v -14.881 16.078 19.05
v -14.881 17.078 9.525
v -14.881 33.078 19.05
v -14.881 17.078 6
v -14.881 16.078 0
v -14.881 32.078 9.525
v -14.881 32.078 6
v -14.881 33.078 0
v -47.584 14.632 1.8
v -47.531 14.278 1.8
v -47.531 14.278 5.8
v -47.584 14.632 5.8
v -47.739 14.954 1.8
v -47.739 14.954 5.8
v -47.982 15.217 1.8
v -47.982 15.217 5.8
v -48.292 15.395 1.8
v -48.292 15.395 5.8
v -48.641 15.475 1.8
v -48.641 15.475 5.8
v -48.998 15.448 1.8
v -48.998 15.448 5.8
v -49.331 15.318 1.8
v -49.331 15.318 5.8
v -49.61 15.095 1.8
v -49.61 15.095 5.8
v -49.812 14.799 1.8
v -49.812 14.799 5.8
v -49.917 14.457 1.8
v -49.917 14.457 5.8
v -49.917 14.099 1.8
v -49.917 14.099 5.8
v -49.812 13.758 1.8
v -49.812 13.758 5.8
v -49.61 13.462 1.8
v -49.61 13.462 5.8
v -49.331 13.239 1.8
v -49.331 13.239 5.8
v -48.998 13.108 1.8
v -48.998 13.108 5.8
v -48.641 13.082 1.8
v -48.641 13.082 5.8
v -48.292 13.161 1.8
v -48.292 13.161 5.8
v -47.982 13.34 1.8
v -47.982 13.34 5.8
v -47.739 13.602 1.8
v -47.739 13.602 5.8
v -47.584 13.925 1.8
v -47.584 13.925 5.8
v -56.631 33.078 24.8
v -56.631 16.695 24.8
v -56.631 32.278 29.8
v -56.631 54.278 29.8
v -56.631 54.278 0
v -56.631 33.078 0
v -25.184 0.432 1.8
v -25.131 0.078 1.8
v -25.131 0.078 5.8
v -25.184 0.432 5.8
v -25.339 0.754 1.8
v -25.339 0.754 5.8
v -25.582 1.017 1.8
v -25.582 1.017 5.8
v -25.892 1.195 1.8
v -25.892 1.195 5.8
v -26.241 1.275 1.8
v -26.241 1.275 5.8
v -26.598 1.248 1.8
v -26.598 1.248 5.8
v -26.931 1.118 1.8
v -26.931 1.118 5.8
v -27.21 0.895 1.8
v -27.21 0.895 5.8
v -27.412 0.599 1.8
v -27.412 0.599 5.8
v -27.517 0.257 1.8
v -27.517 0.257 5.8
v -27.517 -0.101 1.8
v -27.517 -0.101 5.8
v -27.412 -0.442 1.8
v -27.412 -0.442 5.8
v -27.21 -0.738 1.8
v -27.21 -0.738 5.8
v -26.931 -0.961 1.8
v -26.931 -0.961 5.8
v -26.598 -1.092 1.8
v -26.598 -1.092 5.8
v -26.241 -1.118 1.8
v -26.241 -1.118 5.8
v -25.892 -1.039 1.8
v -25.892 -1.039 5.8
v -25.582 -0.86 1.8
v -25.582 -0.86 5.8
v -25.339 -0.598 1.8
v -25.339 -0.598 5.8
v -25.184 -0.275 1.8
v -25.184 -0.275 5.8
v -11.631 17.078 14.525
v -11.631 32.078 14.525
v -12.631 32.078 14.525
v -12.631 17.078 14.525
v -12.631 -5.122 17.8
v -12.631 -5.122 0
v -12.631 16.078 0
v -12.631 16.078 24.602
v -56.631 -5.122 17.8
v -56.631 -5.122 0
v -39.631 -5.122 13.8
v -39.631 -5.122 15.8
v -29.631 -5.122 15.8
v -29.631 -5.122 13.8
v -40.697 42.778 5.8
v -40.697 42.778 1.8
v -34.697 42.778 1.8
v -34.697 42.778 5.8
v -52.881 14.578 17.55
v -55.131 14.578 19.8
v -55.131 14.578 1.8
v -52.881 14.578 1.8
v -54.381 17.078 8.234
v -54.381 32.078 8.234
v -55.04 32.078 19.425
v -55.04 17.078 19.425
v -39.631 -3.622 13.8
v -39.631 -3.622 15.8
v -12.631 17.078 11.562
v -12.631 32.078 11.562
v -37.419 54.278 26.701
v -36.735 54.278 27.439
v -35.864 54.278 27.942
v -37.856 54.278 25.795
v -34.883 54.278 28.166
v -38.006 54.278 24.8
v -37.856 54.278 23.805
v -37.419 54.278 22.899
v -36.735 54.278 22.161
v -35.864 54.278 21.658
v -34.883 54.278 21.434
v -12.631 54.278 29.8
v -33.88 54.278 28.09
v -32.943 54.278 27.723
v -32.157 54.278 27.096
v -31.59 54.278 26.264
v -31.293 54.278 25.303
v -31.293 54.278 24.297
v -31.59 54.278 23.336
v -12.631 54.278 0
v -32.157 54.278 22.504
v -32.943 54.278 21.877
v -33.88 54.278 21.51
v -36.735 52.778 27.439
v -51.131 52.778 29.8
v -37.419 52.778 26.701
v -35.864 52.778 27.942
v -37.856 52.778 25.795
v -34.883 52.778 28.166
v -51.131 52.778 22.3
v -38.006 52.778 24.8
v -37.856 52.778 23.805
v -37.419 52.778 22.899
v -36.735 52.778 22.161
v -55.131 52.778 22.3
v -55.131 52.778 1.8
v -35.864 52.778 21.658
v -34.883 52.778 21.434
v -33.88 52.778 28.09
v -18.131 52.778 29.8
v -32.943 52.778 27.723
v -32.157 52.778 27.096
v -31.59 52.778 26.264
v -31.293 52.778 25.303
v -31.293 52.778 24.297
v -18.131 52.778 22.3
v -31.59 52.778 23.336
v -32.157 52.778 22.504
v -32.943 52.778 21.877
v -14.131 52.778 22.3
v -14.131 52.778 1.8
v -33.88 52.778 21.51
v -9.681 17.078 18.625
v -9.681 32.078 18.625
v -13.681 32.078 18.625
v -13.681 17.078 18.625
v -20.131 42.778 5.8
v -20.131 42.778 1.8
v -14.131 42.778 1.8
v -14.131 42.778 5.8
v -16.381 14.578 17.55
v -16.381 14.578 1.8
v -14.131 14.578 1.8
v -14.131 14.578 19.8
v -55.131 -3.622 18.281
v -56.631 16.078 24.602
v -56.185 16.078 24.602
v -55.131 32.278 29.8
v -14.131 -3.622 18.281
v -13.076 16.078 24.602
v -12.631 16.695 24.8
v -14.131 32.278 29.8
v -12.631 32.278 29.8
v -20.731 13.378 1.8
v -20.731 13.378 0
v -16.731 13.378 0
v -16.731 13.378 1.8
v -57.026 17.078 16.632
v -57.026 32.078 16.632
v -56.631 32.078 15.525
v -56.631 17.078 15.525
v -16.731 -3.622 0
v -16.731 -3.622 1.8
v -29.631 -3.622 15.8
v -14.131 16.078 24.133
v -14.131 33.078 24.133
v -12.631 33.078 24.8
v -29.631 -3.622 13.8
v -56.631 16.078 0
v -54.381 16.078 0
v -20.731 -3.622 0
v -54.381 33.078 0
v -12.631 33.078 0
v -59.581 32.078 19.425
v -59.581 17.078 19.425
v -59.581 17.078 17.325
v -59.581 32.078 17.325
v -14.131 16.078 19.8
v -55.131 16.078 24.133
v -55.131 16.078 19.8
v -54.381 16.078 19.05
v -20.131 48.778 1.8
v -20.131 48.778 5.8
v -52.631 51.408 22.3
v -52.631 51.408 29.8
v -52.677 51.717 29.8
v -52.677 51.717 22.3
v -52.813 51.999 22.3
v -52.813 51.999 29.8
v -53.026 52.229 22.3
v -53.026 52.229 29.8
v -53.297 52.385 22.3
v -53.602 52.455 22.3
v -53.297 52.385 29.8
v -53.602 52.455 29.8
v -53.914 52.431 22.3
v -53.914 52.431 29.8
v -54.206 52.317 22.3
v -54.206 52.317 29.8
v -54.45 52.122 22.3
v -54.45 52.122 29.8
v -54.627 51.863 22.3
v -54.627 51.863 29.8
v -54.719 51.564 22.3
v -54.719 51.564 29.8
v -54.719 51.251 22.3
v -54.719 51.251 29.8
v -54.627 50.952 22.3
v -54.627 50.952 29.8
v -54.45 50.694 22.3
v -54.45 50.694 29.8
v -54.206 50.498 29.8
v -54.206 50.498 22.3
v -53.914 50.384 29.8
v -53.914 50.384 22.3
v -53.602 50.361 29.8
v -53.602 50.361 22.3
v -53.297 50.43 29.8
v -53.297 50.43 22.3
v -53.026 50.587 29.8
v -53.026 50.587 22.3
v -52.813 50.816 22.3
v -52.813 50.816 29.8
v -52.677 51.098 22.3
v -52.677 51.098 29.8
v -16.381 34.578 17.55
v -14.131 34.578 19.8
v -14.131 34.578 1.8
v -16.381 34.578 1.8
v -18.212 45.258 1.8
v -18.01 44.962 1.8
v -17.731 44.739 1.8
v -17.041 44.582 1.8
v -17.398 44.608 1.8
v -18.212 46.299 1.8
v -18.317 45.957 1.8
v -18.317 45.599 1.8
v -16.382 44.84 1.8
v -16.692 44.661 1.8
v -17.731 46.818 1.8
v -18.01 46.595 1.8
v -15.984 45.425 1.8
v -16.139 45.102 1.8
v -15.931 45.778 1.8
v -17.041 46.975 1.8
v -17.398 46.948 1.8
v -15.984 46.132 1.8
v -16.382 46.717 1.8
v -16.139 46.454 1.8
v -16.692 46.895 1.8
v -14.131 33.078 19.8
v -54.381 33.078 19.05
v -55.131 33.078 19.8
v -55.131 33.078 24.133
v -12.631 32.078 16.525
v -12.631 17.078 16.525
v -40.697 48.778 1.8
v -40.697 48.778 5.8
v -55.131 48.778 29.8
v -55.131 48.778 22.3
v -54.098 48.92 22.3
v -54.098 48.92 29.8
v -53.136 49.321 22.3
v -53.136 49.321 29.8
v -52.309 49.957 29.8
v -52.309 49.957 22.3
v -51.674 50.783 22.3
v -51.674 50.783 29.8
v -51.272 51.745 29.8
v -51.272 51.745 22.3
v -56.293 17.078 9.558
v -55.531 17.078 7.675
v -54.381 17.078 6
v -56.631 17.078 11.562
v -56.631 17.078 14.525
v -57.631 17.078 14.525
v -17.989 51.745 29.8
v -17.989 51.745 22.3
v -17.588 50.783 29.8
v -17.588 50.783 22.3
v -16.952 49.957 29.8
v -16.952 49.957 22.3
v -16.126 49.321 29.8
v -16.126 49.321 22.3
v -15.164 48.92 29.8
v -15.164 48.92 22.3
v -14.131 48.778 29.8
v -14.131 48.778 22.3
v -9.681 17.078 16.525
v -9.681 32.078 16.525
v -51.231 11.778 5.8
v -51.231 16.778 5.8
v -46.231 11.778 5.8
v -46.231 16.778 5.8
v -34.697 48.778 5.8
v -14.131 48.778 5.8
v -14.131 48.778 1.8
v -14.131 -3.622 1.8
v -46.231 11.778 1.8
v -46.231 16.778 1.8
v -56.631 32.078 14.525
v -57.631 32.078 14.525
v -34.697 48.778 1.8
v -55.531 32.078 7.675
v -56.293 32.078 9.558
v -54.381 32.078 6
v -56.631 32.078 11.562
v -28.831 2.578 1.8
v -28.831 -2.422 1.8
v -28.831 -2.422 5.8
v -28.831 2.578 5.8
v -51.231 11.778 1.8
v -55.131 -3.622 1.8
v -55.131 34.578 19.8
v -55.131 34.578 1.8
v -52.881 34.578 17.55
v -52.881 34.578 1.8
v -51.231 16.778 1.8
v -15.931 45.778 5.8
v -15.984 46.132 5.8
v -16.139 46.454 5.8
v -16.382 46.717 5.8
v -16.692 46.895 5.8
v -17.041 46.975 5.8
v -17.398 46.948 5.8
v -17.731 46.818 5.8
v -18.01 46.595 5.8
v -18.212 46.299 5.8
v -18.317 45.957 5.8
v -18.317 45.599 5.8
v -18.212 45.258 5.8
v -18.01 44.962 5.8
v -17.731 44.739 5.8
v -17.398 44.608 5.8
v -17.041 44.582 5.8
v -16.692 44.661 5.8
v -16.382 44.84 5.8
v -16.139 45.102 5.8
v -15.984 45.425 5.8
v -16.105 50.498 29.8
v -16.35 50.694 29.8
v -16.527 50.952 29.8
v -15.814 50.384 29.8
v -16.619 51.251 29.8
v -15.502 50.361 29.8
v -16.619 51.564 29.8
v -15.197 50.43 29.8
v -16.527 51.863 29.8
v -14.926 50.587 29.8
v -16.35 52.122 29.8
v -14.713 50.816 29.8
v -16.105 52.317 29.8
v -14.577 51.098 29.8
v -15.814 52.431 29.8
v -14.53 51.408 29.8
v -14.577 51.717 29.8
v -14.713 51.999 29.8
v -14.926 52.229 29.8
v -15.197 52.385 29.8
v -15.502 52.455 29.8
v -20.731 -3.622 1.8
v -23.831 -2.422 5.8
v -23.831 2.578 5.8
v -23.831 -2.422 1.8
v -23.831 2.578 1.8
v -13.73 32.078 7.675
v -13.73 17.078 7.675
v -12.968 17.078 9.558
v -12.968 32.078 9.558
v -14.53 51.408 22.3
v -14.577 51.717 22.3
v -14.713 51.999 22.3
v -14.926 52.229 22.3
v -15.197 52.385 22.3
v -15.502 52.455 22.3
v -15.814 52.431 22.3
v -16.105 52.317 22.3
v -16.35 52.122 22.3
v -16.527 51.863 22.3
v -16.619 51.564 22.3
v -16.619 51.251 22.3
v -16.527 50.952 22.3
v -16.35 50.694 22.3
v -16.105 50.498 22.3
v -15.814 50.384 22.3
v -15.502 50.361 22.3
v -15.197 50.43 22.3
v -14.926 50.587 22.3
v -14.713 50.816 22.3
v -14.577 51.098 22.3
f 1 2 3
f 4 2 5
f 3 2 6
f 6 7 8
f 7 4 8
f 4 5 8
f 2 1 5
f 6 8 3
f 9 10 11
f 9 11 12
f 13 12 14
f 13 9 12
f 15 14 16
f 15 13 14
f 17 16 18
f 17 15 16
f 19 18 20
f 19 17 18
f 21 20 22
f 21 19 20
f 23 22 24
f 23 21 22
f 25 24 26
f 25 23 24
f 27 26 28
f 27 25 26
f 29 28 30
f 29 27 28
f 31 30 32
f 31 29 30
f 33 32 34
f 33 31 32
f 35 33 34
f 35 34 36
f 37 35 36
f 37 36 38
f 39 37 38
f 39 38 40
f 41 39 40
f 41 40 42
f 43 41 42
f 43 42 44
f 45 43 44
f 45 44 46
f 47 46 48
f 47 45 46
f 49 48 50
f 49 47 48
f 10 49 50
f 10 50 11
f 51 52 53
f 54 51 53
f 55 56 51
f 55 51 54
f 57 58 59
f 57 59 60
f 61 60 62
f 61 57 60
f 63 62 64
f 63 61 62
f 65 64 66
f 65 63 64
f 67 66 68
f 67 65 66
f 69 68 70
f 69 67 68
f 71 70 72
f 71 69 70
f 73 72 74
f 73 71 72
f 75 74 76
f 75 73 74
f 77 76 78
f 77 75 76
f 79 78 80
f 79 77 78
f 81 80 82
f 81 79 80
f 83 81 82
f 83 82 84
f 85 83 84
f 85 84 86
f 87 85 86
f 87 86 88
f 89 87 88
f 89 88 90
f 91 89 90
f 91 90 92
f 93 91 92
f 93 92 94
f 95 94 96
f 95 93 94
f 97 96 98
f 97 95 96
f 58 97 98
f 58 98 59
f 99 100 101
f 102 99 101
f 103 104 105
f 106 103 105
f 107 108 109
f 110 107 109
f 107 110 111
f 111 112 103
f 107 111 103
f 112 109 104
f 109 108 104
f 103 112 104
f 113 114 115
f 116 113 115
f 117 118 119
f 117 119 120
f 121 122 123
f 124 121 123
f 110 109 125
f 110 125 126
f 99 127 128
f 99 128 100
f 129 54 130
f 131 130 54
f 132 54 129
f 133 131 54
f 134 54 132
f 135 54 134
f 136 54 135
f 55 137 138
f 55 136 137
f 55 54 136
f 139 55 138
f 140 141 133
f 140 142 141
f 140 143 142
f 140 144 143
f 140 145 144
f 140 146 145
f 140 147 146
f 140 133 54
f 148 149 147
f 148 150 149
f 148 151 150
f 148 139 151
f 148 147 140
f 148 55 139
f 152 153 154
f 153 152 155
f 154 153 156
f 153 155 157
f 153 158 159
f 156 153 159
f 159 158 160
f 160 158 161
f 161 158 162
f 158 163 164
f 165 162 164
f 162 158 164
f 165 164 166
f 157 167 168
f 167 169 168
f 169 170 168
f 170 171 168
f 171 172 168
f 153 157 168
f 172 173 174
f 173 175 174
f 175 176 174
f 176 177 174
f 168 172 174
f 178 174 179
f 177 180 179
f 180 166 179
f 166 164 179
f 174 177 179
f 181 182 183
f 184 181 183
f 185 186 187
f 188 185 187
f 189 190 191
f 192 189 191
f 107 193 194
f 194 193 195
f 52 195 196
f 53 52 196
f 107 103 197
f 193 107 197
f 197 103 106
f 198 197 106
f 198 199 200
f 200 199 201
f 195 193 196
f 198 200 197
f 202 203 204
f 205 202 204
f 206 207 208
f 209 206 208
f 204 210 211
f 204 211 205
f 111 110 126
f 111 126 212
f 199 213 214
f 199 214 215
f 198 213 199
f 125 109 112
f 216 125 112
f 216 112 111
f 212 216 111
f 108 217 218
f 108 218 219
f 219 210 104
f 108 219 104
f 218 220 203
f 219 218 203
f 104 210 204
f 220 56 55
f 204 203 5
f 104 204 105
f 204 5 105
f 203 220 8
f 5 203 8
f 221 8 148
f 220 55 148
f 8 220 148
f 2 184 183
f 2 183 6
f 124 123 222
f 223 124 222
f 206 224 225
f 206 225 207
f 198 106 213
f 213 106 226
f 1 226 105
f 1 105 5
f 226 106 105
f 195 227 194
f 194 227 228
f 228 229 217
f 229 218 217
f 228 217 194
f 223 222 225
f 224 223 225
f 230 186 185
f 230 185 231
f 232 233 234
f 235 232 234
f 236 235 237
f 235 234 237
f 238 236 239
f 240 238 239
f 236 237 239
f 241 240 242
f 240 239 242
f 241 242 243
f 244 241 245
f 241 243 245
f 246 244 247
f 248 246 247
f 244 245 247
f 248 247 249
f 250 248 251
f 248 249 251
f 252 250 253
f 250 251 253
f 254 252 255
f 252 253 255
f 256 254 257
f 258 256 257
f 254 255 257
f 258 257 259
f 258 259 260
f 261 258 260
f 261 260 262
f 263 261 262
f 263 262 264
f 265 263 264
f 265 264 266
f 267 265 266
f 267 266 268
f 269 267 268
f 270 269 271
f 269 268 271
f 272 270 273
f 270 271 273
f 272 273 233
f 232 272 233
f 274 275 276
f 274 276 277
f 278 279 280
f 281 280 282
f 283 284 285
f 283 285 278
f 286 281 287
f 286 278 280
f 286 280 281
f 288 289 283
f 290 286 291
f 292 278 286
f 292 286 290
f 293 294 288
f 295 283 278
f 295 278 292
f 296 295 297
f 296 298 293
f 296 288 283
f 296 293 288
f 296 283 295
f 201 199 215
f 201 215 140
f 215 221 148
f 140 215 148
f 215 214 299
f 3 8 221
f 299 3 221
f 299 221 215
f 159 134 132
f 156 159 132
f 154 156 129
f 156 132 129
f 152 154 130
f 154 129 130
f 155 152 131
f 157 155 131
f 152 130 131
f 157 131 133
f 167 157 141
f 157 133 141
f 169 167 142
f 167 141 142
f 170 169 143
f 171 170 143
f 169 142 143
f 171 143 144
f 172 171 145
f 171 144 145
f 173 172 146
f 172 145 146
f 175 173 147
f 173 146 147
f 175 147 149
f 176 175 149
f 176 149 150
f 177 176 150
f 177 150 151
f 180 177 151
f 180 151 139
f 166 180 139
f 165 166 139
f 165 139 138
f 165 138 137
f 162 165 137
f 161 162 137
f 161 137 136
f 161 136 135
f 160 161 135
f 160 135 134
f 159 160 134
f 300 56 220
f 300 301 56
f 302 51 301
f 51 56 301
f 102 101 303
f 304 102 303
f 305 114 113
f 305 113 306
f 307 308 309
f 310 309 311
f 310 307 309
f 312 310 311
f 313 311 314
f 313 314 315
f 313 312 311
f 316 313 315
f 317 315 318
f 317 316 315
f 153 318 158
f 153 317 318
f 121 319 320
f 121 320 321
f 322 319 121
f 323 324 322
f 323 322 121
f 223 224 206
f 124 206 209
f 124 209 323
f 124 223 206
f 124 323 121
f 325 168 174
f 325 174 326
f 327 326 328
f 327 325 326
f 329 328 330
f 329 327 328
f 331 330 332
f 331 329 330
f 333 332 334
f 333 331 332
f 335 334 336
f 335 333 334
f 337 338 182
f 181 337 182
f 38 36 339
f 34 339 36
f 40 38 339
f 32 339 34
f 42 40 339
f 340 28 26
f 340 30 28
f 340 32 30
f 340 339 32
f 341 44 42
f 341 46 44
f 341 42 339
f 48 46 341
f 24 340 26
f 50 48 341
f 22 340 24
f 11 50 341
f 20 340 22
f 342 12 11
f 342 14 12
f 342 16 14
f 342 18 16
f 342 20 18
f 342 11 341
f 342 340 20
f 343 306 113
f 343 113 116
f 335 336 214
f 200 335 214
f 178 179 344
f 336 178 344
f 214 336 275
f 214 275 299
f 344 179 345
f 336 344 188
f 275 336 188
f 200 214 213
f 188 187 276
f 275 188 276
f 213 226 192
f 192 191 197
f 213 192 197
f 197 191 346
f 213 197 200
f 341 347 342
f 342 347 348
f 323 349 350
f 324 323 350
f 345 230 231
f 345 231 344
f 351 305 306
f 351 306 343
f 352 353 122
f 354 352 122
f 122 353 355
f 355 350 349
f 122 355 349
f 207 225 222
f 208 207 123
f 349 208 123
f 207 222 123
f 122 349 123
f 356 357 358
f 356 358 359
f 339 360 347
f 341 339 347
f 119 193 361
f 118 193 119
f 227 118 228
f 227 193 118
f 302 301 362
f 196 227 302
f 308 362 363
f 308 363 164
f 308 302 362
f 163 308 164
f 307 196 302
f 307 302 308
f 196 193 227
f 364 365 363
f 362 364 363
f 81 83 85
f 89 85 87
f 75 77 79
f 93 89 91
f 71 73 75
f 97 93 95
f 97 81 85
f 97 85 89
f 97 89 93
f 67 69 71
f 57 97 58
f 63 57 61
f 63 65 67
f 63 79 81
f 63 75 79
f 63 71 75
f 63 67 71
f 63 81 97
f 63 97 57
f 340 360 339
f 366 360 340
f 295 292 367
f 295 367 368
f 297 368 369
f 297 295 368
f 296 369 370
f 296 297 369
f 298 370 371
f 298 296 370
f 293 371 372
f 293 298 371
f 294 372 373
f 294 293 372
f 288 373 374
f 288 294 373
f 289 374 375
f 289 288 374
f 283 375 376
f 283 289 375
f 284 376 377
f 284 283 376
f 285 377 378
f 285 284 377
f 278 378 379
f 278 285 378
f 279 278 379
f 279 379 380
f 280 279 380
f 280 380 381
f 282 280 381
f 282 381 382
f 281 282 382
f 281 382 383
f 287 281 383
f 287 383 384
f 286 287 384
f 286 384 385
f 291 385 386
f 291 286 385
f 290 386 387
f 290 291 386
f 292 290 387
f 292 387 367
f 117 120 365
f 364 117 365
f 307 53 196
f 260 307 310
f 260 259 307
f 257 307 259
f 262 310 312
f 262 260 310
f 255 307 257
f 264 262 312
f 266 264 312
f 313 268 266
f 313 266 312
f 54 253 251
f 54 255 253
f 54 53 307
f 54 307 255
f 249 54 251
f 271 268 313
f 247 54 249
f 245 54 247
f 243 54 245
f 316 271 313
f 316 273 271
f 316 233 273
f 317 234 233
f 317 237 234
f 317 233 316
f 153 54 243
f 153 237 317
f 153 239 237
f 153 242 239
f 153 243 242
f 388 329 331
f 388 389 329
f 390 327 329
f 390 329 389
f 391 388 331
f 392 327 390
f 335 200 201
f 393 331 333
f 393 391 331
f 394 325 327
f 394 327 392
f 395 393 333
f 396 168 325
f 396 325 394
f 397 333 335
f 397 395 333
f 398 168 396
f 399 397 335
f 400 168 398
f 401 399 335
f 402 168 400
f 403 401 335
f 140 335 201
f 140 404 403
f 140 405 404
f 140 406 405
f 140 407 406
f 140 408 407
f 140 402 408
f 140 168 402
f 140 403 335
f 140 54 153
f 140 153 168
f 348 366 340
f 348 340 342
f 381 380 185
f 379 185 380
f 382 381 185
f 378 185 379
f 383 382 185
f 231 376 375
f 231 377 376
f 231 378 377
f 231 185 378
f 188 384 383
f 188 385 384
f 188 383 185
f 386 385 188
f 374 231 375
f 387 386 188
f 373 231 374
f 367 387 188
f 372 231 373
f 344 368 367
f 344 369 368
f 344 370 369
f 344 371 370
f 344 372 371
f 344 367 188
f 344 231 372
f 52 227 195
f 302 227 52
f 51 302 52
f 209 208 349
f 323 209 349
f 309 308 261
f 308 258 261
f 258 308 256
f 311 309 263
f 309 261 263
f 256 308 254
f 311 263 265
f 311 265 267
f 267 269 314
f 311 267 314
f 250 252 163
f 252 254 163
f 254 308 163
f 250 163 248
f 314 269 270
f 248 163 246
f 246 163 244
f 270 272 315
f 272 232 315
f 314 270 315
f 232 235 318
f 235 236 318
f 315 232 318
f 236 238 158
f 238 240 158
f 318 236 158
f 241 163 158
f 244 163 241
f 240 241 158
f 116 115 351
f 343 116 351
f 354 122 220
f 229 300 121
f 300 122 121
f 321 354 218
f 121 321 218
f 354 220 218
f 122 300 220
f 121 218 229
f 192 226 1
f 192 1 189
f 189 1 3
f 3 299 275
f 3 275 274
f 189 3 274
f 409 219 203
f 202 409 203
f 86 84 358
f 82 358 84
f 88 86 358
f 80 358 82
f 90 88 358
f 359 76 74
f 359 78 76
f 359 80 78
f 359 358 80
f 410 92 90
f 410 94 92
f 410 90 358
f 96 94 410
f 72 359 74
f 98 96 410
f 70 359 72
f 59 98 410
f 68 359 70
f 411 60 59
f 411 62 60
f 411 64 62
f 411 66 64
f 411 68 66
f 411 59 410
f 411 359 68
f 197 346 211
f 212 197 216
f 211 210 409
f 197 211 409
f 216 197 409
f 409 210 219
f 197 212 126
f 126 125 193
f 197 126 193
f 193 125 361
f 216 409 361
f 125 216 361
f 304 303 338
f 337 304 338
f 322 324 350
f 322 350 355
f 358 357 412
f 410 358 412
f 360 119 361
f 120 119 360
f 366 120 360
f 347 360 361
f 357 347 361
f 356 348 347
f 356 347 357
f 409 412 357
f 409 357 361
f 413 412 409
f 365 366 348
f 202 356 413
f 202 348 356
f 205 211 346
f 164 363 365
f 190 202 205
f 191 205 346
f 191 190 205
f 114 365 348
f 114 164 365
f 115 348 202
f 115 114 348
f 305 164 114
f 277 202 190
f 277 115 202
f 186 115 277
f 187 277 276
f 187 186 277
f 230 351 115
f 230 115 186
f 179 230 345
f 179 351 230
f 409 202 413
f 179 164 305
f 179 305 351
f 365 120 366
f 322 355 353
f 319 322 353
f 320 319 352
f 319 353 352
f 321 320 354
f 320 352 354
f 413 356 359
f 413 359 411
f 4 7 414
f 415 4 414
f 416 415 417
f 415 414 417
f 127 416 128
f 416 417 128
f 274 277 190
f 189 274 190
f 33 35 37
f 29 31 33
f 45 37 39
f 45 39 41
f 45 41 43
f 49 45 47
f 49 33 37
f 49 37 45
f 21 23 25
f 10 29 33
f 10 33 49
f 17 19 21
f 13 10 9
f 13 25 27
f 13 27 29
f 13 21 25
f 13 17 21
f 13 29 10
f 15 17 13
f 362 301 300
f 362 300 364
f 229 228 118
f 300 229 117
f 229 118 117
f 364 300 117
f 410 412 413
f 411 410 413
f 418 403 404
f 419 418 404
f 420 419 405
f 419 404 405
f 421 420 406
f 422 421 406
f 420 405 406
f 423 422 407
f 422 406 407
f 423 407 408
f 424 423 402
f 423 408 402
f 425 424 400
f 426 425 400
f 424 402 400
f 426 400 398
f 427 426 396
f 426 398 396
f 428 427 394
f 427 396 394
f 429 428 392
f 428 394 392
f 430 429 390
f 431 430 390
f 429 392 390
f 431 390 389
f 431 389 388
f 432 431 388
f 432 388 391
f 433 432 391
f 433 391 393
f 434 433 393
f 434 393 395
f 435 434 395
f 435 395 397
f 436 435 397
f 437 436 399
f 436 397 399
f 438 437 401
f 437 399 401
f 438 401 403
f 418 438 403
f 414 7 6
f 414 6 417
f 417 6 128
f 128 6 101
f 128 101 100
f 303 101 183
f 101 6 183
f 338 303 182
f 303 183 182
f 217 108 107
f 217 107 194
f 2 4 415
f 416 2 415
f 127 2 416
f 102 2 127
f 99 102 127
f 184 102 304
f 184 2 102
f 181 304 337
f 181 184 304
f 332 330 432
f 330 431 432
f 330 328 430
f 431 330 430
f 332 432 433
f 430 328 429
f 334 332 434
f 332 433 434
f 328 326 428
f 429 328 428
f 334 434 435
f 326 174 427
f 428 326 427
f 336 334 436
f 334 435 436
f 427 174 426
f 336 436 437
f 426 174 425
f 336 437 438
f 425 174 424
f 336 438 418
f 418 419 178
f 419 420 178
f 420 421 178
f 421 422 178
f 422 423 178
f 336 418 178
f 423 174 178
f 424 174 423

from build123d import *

# Parameters (mm, degrees)
F0_W      = 4
F0_H      = 17
F1_DEPTH  = 1.8
F3_DEPTH  = 22
F4_W      = 44
F4_H      = 59.4
F5_DEPTH  = 6
F6_W      = 2.25
F6_H      = 20
F7_DEPTH  = 10
F9_DEPTH  = 20
F11_DEPTH = 17
F13_DEPTH = 20
F15_DEPTH = 17
F17_DEPTH = 45
F18_R     = 3.375
F19_DEPTH = 3
F20_R     = 1.05
F21_DEPTH = 7.5
F22_W     = 10
F22_H     = 2
F23_DEPTH = 2.5
F25_START = 1
F24_W     = 2.95
F24_H     = 2.1
F25_DEPTH = 15
F26_W     = 5
F26_H     = 5
F26_R     = 1.2
F26_W_2   = 6
F26_H_2   = 6
F27_DEPTH = 4


# Not quite as in the source:
# - a feature names something its author has since deleted; it is built from what else it names


with BuildPart() as f1:
    # F0 (on Top) → F1 (new body)
    with BuildSketch(Plane.XY):
        Polygon((-12.630645159, 54.2783500865), (-56.630645159, 54.2783500865), (-56.630645159, 33.0783500865), (-54.380645159, 33.0783500865), (-54.380645159, 16.0783500865), (-56.630645159, 16.0783500865), (-56.630645159, -5.1216499135), (-12.630645159, -5.1216499135), (-12.630645159, 16.0783500865), (-14.880645159, 16.0783500865), (-14.880645159, 33.0783500865), (-12.630645159, 33.0783500865), align=None)
        with Locations((-18.730645159, 4.8783500865)):
            Rectangle(F0_W, F0_H, mode=Mode.SUBTRACT)
    extrude(amount=F1_DEPTH)

    # F2 (on face) → F3 (join)
    with BuildSketch(Plane.XY.offset(1.8)):
        Polygon((-12.630645159, 33.0783500865), (-12.630645159, 54.2783500865), (-56.630645159, 54.2783500865), (-56.630645159, 33.0783500865), (-54.380645159, 33.0783500865), (-54.380645159, 16.0783500865), (-56.630645159, 16.0783500865), (-56.630645159, -5.1216499135), (-12.630645159, -5.1216499135), (-12.630645159, 16.0783500865), (-14.880645159, 16.0783500865), (-14.880645159, 33.0783500865), align=None)
        Polygon((-55.130645159, 34.5783500865), (-55.130645159, 52.7783500865), (-14.130645159, 52.7783500865), (-14.130645159, 34.5783500865), (-16.380645159, 34.5783500865), (-16.380645159, 14.5783500865), (-14.130645159, 14.5783500865), (-14.130645159, -3.6216499135), (-16.730645159, -3.6216499135), (-20.730645159, -3.6216499135), (-55.130645159, -3.6216499135), (-55.130645159, 14.5783500865), (-52.880645159, 14.5783500865), (-52.880645159, 34.5783500865), align=None, mode=Mode.SUBTRACT)
    extrude(amount=F3_DEPTH)

    # F4 (on face) → F5 (join)
    with BuildSketch(Plane.XY.offset(23.8)):
        with Locations((-34.630645159, 24.5783500865)):
            Rectangle(F4_W, F4_H)
        Polygon((-55.130645159, 34.5783500865), (-55.130645159, 52.7783500865), (-14.130645159, 52.7783500865), (-14.130645159, 34.5783500865), (-16.380645159, 34.5783500865), (-16.380645159, 14.5783500865), (-14.130645159, 14.5783500865), (-14.130645159, -3.6216499135), (-55.130645159, -3.6216499135), (-55.130645159, 14.5783500865), (-52.880645159, 14.5783500865), (-52.880645159, 34.5783500865), align=None, mode=Mode.SUBTRACT)
    extrude(amount=F5_DEPTH)

    # F6 (on face) → F7 (cut)
    with BuildSketch(Plane.XY.offset(29.8)):
        with Locations((-54.005645159, 24.5783500865)):
            Rectangle(F6_W, F6_H)
        with Locations((-15.255645159, 24.5783500865)):
            Rectangle(F6_W, F6_H)
    extrude(amount=-F7_DEPTH, mode=Mode.SUBTRACT)

    # F8 (on face) → F9 (cut)
    with BuildSketch(Plane.XZ.offset(-14.5783500865)):
        Polygon((-52.880645159, 19.8), (-55.130645159, 19.8), (-52.880645159, 17.55), align=None)
    extrude(amount=-F9_DEPTH, mode=Mode.SUBTRACT)

    # F10 (on face) → F11 (cut)
    with BuildSketch(Plane.XZ.offset(-33.0783500865)):
        Polygon((-56.630645159, 24.8), (-56.630645159, 23.8), (-55.880645159, 23.8), (-54.380645159, 23.8), align=None)
    extrude(amount=F11_DEPTH, mode=Mode.SUBTRACT)

    # F12 (on face) → F13 (cut)
    with BuildSketch(Plane(origin=(0, 34.5783500865, 0), x_dir=(-1, 0, 0), z_dir=(0, 1, 0))):
        Polygon((16.380645159, 17.55), (16.380645159, 19.8), (14.130645159, 19.8), align=None)
    extrude(amount=-F13_DEPTH, mode=Mode.SUBTRACT)

    # F14 (on face) → F15 (cut)
    with BuildSketch(Plane(origin=(0, 16.0783500865, 0), x_dir=(-1, 0, 0), z_dir=(0, 1, 0))):
        Polygon((12.630645159, 24.8), (12.630645159, 23.8), (14.880645159, 23.8), align=None)
    extrude(amount=F15_DEPTH, mode=Mode.SUBTRACT)

    # F16 (on face) → F17 (cut)
    with BuildSketch(Plane.YZ.offset(-12.630645159)):
        Polygon((32.2783500865, 29.8), (-5.1216499135, 29.8), (-5.1216499135, 17.8), align=None)
    extrude(amount=-F17_DEPTH, mode=Mode.SUBTRACT)

    # F18 (on face) → F19 (cut)
    with BuildSketch(Plane(origin=(0, 54.2783500865, 0), x_dir=(-1, 0, 0), z_dir=(0, 1, 0))):
        with Locations((34.630645159, 24.8)):
            Circle(F18_R)
    extrude(amount=-F19_DEPTH, mode=Mode.SUBTRACT)

    # F20 (on face) → F21 (join)
    with BuildSketch(Plane.XY.offset(29.8)):
        with BuildLine():
            Line((-55.130645159, 52.7783500865), (-55.130645159, 48.7783500865))
            ThreePointArc((-55.130645159, 48.7783500865), (-52.3091414621, 49.9568463896), (-51.130645159, 52.7783500865))
            Line((-51.130645159, 52.7783500865), (-55.130645159, 52.7783500865))
        make_face()
        with Locations((-53.6807930499, 51.4078039413)):
            Circle(F20_R, mode=Mode.SUBTRACT)
        with BuildLine():
            Line((-14.130645159, 52.7783500865), (-18.130645159, 52.7783500865))
            ThreePointArc((-18.130645159, 52.7783500865), (-16.952148856, 49.9568463896), (-14.130645159, 48.7783500865))
            Line((-14.130645159, 48.7783500865), (-14.130645159, 52.7783500865))
        make_face()
        with Locations((-15.5804972681, 51.4078039413)):
            Circle(F20_R, mode=Mode.SUBTRACT)
    extrude(amount=-F21_DEPTH)

    # F22 (on face) → F23 (cut)
    with BuildSketch(Plane.XZ.offset(5.1216499135)):
        with Locations((-34.630645159, 14.8)):
            Rectangle(F22_W, F22_H)
    extrude(amount=-F23_DEPTH, mode=Mode.SUBTRACT)

    # F24 (on face) → F25 (join)
    with BuildSketch(Plane.XZ.offset(-33.0783500865).offset(F25_START)):
        with Locations((-11.155645159, 17.575)):
            Rectangle(F24_W, F24_H)
        with BuildLine():
            Line((-14.880645159, 9.525), (-14.880645159, 6))
            ThreePointArc((-14.880645159, 6), (-13.2978940887, 8.5959050075), (-12.630645159, 11.5621488653))
            Line((-12.630645159, 11.5621488653), (-12.630645159, 14.525))
            Line((-12.630645159, 14.525), (-12.630645159, 16.525))
            Line((-12.630645159, 16.525), (-12.630645159, 18.625))
            Line((-12.630645159, 18.625), (-13.680645159, 18.625))
            Line((-13.680645159, 18.625), (-14.880645159, 9.525))
        make_face()
        Polygon((-12.630645159, 14.525), (-12.630645159, 11.5621488653), (-11.630645159, 14.525), align=None)
        with BuildLine():
            Line((-57.630645159, 14.525), (-56.630645159, 11.5621488653))
            ThreePointArc((-56.630645159, 11.5621488653), (-55.9633962294, 8.5959050075), (-54.380645159, 6))
            Line((-54.380645159, 6), (-54.380645159, 8.2336284751))
            Line((-54.380645159, 8.2336284751), (-55.0399858184, 19.425))
            Line((-55.0399858184, 19.425), (-59.580645159, 19.425))
            Line((-59.580645159, 19.425), (-59.580645159, 17.325))
            Line((-59.580645159, 17.325), (-57.0257989239, 16.632160343))
            Line((-57.0257989239, 16.632160343), (-56.630645159, 15.525))
            Line((-56.630645159, 15.525), (-56.630645159, 14.525))
            Line((-56.630645159, 14.525), (-57.630645159, 14.525))
        make_face()
    extrude(amount=F25_DEPTH)

    # F26 (on face) → F27 (join)
    with BuildSketch(Plane.XY.offset(1.8)):
        with Locations((-48.730645159, 14.2783500865)):
            Rectangle(F26_W, F26_H)
        with Locations((-48.730645159, 14.2783500865)):
            Circle(F26_R, mode=Mode.SUBTRACT)
        with Locations((-26.330645159, 0.0783500865)):
            Rectangle(F26_W, F26_H)
        with Locations((-26.330645159, 0.0783500865)):
            Circle(F26_R, mode=Mode.SUBTRACT)
        with Locations((-17.130645159, 45.7783500865)):
            Rectangle(F26_W_2, F26_H_2)
        with Locations((-17.130645159, 45.7783500865)):
            Circle(F26_R, mode=Mode.SUBTRACT)
        with Locations((-37.6969575882, 45.7783500865)):
            Rectangle(F26_W_2, F26_H_2)
    extrude(amount=F27_DEPTH)


solid = f1.part
